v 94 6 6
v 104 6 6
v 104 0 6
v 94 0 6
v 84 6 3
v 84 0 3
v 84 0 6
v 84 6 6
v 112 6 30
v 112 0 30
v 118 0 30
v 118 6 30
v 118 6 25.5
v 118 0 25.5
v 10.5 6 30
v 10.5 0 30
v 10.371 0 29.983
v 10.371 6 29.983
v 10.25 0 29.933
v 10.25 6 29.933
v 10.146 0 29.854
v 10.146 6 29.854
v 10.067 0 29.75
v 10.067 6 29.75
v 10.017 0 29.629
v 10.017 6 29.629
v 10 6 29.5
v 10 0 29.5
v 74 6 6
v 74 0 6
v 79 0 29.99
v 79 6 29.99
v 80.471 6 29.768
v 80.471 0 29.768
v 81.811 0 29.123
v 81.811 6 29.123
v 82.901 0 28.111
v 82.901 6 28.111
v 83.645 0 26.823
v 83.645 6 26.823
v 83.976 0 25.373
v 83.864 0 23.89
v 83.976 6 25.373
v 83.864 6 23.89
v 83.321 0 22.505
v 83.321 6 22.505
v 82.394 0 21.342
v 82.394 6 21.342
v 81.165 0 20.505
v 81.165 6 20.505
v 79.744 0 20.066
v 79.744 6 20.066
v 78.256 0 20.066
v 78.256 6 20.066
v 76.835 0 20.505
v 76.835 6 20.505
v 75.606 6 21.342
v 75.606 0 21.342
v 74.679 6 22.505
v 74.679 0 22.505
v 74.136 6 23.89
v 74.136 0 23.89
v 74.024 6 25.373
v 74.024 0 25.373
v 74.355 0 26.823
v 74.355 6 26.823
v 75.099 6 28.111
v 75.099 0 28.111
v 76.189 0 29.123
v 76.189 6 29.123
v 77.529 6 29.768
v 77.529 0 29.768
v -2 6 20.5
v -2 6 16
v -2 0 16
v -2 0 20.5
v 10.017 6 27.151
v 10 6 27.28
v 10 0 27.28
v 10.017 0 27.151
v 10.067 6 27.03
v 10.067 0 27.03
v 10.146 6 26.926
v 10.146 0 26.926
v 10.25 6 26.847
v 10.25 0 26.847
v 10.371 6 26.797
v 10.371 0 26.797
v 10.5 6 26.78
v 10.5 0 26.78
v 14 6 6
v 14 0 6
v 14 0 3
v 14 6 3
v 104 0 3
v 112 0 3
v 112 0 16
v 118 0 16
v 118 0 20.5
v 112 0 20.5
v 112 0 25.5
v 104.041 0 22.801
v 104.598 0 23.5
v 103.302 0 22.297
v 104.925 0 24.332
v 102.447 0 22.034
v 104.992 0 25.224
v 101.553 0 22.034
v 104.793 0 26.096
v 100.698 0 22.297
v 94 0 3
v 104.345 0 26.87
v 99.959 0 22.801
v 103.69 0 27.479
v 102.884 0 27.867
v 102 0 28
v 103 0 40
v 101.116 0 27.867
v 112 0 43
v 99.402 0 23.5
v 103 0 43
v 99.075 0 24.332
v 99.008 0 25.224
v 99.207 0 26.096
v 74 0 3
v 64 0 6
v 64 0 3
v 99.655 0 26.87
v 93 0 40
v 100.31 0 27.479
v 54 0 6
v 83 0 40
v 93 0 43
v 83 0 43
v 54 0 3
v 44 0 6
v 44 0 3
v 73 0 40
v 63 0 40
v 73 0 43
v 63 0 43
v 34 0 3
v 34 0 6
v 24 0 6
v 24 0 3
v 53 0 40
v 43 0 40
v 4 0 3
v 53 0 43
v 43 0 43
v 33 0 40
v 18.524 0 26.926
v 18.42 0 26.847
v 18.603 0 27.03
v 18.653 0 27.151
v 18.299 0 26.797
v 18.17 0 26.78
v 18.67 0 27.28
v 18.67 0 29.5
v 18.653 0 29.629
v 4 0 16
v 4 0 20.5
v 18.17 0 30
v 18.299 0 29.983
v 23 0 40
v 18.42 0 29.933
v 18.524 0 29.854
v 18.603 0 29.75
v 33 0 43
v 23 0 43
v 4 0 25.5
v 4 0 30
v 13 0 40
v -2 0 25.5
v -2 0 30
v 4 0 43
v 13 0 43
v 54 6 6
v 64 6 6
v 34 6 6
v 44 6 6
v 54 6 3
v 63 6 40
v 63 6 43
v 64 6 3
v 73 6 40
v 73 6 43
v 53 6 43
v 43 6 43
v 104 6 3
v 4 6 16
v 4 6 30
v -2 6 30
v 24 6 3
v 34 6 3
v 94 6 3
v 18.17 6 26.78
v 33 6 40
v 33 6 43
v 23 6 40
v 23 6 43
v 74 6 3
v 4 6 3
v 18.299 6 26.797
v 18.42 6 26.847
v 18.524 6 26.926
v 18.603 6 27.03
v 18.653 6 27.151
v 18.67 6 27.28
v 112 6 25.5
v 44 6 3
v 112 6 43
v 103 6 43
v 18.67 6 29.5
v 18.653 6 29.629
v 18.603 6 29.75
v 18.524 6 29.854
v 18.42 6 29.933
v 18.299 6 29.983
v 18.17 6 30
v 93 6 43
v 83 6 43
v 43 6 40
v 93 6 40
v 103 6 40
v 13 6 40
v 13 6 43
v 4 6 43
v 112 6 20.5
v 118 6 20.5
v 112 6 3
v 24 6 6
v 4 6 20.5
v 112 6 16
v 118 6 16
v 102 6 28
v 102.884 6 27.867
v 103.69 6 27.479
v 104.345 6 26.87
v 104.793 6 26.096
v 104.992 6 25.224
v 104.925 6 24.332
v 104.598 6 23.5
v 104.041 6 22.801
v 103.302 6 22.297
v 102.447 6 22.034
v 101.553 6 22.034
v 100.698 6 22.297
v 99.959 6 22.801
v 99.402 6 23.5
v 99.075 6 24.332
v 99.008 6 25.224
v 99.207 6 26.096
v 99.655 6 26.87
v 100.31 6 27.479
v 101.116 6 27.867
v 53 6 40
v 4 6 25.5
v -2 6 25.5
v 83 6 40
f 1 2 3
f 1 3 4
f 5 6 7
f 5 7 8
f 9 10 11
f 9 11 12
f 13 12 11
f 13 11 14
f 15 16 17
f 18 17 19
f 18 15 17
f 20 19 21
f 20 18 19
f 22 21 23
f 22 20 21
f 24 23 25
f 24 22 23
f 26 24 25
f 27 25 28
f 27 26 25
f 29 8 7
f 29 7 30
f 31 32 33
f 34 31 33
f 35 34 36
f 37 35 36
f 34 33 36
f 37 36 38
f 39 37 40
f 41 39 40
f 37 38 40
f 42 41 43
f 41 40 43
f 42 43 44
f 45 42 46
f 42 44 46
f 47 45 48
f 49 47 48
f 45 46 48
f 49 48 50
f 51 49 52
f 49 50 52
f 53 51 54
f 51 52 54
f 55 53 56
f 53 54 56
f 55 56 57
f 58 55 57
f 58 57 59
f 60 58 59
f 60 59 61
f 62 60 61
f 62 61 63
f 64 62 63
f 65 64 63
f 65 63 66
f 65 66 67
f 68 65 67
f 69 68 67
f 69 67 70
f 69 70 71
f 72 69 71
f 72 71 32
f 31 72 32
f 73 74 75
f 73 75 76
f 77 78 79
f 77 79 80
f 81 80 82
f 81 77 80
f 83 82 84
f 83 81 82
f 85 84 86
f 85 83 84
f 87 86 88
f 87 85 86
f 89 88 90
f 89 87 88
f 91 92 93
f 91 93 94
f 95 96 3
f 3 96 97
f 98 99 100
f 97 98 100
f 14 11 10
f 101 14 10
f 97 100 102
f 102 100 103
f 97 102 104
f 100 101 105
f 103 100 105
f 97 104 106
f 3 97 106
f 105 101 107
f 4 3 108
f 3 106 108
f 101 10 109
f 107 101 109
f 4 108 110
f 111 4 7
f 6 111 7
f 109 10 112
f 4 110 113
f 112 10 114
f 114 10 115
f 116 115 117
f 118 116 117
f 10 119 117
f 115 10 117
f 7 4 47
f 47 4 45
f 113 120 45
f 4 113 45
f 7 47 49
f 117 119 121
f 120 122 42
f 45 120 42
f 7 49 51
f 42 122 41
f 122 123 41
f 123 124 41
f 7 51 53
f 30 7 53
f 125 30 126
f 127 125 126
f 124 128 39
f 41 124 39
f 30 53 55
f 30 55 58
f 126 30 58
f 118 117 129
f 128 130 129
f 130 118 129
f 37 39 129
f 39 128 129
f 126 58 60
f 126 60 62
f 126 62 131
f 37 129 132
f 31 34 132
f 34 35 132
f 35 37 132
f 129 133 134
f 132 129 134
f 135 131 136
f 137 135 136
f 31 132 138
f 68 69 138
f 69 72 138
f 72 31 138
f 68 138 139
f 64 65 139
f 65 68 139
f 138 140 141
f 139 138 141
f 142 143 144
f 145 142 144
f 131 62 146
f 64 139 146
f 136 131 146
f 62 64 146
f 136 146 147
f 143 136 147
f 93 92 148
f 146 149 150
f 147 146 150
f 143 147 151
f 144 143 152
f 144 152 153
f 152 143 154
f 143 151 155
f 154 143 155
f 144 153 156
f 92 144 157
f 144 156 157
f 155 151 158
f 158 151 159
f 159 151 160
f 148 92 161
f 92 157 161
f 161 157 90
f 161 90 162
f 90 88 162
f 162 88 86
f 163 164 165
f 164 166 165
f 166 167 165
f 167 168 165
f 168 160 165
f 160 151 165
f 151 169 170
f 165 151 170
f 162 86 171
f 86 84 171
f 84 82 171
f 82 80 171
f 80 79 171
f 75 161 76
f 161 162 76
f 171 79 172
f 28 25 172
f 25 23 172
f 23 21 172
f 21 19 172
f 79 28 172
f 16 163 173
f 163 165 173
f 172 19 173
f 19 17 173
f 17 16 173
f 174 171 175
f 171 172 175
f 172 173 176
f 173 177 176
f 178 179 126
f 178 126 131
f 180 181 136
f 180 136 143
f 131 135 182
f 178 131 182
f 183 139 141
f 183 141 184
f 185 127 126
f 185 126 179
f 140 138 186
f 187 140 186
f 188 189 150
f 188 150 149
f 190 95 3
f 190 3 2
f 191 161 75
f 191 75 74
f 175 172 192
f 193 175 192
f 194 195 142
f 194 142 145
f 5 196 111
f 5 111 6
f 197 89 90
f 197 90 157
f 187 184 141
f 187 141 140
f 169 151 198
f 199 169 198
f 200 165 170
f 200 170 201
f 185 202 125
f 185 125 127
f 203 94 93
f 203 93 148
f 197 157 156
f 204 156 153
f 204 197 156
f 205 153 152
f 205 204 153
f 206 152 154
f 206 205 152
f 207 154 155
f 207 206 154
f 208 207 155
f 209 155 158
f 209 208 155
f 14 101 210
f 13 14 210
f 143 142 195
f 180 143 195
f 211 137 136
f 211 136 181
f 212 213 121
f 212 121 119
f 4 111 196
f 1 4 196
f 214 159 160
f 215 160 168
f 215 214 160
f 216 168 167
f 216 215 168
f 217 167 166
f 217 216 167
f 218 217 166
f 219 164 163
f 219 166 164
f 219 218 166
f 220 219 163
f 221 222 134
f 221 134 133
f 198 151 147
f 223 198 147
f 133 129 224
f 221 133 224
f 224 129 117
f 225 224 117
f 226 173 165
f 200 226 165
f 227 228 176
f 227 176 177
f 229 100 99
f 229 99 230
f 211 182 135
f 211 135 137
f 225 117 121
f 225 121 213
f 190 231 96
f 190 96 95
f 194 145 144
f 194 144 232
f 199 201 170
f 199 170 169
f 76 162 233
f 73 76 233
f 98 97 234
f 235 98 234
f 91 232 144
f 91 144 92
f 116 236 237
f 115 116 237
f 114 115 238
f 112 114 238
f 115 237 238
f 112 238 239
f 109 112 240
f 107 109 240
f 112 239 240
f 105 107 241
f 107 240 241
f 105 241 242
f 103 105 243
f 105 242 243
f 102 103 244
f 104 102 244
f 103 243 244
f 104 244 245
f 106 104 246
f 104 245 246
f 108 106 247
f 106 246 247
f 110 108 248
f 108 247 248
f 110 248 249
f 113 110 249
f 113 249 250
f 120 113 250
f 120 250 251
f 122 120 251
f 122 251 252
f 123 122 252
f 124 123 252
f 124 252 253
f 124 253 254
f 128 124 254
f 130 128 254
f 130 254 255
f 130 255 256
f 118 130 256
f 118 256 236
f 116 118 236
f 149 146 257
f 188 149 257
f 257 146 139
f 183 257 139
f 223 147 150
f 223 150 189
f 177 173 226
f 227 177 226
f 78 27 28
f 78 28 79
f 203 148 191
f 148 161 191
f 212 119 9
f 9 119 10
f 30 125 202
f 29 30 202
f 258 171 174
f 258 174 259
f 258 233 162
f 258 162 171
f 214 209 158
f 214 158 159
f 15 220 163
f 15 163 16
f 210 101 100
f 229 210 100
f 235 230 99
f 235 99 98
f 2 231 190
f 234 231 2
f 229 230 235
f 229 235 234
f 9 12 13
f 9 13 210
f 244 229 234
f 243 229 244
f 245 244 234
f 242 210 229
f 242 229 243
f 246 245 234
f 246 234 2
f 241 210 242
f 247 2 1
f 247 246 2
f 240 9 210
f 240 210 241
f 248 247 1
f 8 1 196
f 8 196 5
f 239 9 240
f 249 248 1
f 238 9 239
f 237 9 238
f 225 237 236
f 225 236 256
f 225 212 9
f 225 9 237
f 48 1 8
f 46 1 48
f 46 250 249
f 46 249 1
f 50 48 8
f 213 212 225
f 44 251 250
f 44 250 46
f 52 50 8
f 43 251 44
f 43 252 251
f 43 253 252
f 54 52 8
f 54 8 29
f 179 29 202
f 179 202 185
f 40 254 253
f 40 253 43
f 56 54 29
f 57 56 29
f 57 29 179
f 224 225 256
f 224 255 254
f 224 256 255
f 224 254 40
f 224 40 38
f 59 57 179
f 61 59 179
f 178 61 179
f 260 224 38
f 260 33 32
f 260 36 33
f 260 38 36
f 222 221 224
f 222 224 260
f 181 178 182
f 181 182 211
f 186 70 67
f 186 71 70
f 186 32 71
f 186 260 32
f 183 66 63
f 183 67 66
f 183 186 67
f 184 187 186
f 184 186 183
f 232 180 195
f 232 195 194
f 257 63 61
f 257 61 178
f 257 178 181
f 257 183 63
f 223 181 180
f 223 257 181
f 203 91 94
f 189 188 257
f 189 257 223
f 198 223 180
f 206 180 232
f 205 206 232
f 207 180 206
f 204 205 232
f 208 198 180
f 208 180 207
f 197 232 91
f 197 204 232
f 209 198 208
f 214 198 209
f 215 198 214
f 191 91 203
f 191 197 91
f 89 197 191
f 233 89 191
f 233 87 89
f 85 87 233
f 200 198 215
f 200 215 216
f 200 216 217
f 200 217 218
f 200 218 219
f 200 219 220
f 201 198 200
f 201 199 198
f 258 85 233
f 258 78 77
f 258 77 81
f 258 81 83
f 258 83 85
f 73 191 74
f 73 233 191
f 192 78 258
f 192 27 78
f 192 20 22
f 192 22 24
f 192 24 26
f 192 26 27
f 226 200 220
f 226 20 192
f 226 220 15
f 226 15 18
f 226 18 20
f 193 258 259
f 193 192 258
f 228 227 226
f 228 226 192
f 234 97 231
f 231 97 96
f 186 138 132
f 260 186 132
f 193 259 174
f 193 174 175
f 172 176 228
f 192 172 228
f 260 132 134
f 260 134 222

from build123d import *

# Parameters (mm, degrees)
SKETCH_1_W          = 112
SKETCH_1_H          = 40
EXTRUDE_1_DEPTH     = 6
SKETCH_2_R          = 3
CUT_EXTRUDE_1_DEPTH = 120.079805173
CUT_EXTRUDE_2_DEPTH = 10
SKETCH_4_R          = 4.9895
CUT_EXTRUDE_3_DEPTH = 120.079805173
SKETCH_6_W          = 4.5
SKETCH_6_H          = 6
EXTRUDE_3_DEPTH     = 6
SKETCH_11_W         = 40
SKETCH_11_H         = 6
CUT_EXTRUDE_4_DEPTH = 4
SKETCH_12_W         = 4.5
SKETCH_12_H         = 6
EXTRUDE_10_DEPTH    = 6
SKETCH_13_W         = 9
SKETCH_13_H         = 6
SKETCH_13_W_2       = 10
EXTRUDE_11_DEPTH    = 3
SKETCH_14_W         = 108
SKETCH_14_H         = 6
CUT_EXTRUDE_5_DEPTH = 2
SKETCH_15_W         = 108
SKETCH_15_H         = 6
CUT_EXTRUDE_6_DEPTH = 2
SKETCH_16_W         = 10
SKETCH_16_H         = 6
CUT_EXTRUDE_7_DEPTH = 3
SKETCH_17_W         = 10
SKETCH_17_H         = 6
SKETCH_17_W_2       = 8
EXTRUDE_12_DEPTH    = 1
SKETCH_18_W         = 10
SKETCH_18_H         = 6
EXTRUDE_13_DEPTH    = 1


with BuildPart() as part:
    # Эскиз1 → Бобышка-Вытянуть1 (new body)
    with BuildSketch(Plane(origin=(0, 0, 0), x_dir=(1, 0, 0), z_dir=(0, 1, 0))):
        with Locations((56, -20)):
            Rectangle(SKETCH_1_W, SKETCH_1_H)
    extrude(amount=EXTRUDE_1_DEPTH)

    # Эскиз2 → Вырез-Вытянуть1 (cut, through all)
    with BuildSketch(Plane(origin=(0, 6, 0), x_dir=(1, 0, 0), z_dir=(0, 1, 0))):
        with Locations(Location((102, -25, 0), (0, 0, 270))):
            Circle(SKETCH_2_R)
    extrude(amount=-CUT_EXTRUDE_1_DEPTH, mode=Mode.SUBTRACT)

    # Эскиз3 → Вырез-Вытянуть2 (cut)
    with BuildSketch(Plane(origin=(0, 6, 0), x_dir=(1, 0, 0), z_dir=(0, 1, 0))):
        with BuildLine():
            Line((10.5, -26.78), (18.17, -26.78))
            ThreePointArc((18.17, -26.78), (18.523553391, -26.926446609), (18.67, -27.28))
            Line((18.67, -27.28), (18.67, -29.5))
            ThreePointArc((18.67, -29.5), (18.523553391, -29.853553391), (18.17, -30))
            Line((18.17, -30), (10.5, -30))
            ThreePointArc((10.5, -30), (10.146446609, -29.853553391), (10, -29.5))
            Line((10, -29.5), (10, -27.28))
            ThreePointArc((10, -27.28), (10.146446609, -26.926446609), (10.5, -26.78))
        make_face()
    extrude(amount=-CUT_EXTRUDE_2_DEPTH, mode=Mode.SUBTRACT)

    # Эскиз4 → Вырез-Вытянуть3 (cut, through all)
    with BuildSketch(Plane(origin=(0, 6, 0), x_dir=(1, 0, 0), z_dir=(0, 1, 0))):
        with Locations(Location((79, -25, 0), (0, 0, 270))):
            Circle(SKETCH_4_R)
    extrude(amount=-CUT_EXTRUDE_3_DEPTH, mode=Mode.SUBTRACT)

    # Эскиз6 → Бобышка-Вытянуть3 (add)
    with BuildSketch(Plane(origin=(112, 0, 0), x_dir=(0, 0, -1), z_dir=(1, 0, 0))):
        with Locations((-27.75, 3)):
            Rectangle(SKETCH_6_W, SKETCH_6_H)
        with Locations((-18.25, 3)):
            Rectangle(SKETCH_6_W, SKETCH_6_H)
    extrude(amount=EXTRUDE_3_DEPTH)

    # Эскиз11 → Вырез-Вытянуть4 (cut)
    with BuildSketch(Plane.ZY):
        with Locations((20, 3)):
            Rectangle(SKETCH_11_W, SKETCH_11_H)
    extrude(amount=-CUT_EXTRUDE_4_DEPTH, mode=Mode.SUBTRACT)

    # Эскиз12 → Бобышка-Вытянуть10 (add)
    with BuildSketch(Plane.ZY.offset(-4)):
        with Locations((18.25, 3)):
            Rectangle(SKETCH_12_W, SKETCH_12_H)
        with Locations((27.75, 3)):
            Rectangle(SKETCH_12_W, SKETCH_12_H)
    extrude(amount=EXTRUDE_10_DEPTH)

    # Эскиз13 → Бобышка-Вытянуть11 (add)
    with BuildSketch(Plane.XY.offset(40)):
        with Locations((8.5, 3)):
            Rectangle(SKETCH_13_W, SKETCH_13_H)
        with Locations((107.5, 3)):
            Rectangle(SKETCH_13_W, SKETCH_13_H)
        with Locations((28, 3)):
            Rectangle(SKETCH_13_W_2, SKETCH_13_H)
        with Locations((48, 3)):
            Rectangle(SKETCH_13_W_2, SKETCH_13_H)
        with Locations((68, 3)):
            Rectangle(SKETCH_13_W_2, SKETCH_13_H)
        with Locations((88, 3)):
            Rectangle(SKETCH_13_W_2, SKETCH_13_H)
    extrude(amount=EXTRUDE_11_DEPTH)

    # Эскиз14 → Вырез-Вытянуть5 (cut)
    with BuildSketch(Plane(origin=(0, 0, 0), x_dir=(-1, 0, 0), z_dir=(0, 0, -1))):
        with Locations((-58, 3)):
            Rectangle(SKETCH_14_W, SKETCH_14_H)
    extrude(amount=-CUT_EXTRUDE_5_DEPTH, mode=Mode.SUBTRACT)

    # Эскиз15 → Вырез-Вытянуть6 (cut)
    with BuildSketch(Plane(origin=(0, 0, 2), x_dir=(-1, 0, 0), z_dir=(0, 0, -1))):
        with Locations((-58, 3)):
            Rectangle(SKETCH_15_W, SKETCH_15_H)
    extrude(amount=-CUT_EXTRUDE_6_DEPTH, mode=Mode.SUBTRACT)

    # Эскиз16 → Вырез-Вытянуть7 (cut)
    with BuildSketch(Plane(origin=(0, 0, 4), x_dir=(-1, 0, 0), z_dir=(0, 0, -1))):
        with Locations((-19, 3)):
            Rectangle(SKETCH_16_W, SKETCH_16_H)
        with Locations((-39, 3)):
            Rectangle(SKETCH_16_W, SKETCH_16_H)
        with Locations((-59, 3)):
            Rectangle(SKETCH_16_W, SKETCH_16_H)
        with Locations((-79, 3)):
            Rectangle(SKETCH_16_W, SKETCH_16_H)
        with Locations((-99, 3)):
            Rectangle(SKETCH_16_W, SKETCH_16_H)
    extrude(amount=-CUT_EXTRUDE_7_DEPTH, mode=Mode.SUBTRACT)

    # Эскиз17 → Бобышка-Вытянуть12 (add)
    with BuildSketch(Plane(origin=(0, 0, 4), x_dir=(-1, 0, 0), z_dir=(0, 0, -1))):
        with Locations((-9, 3)):
            Rectangle(SKETCH_17_W, SKETCH_17_H)
        with Locations((-29, 3)):
            Rectangle(SKETCH_17_W, SKETCH_17_H)
        with Locations((-49, 3)):
            Rectangle(SKETCH_17_W, SKETCH_17_H)
        with Locations((-69, 3)):
            Rectangle(SKETCH_17_W, SKETCH_17_H)
        with Locations((-89, 3)):
            Rectangle(SKETCH_17_W, SKETCH_17_H)
        with Locations((-108, 3)):
            Rectangle(SKETCH_17_W_2, SKETCH_17_H)
    extrude(amount=EXTRUDE_12_DEPTH)

    # Эскиз18 → Бобышка-Вытянуть13 (add)
    with BuildSketch(Plane(origin=(0, 0, 7), x_dir=(-1, 0, 0), z_dir=(0, 0, -1))):
        with Locations((-19, 3)):
            Rectangle(SKETCH_18_W, SKETCH_18_H)
        with Locations((-39, 3)):
            Rectangle(SKETCH_18_W, SKETCH_18_H)
        with Locations((-59, 3)):
            Rectangle(SKETCH_18_W, SKETCH_18_H)
        with Locations((-79, 3)):
            Rectangle(SKETCH_18_W, SKETCH_18_H)
        with Locations((-99, 3)):
            Rectangle(SKETCH_18_W, SKETCH_18_H)
    extrude(amount=EXTRUDE_13_DEPTH)


solid = part.part
